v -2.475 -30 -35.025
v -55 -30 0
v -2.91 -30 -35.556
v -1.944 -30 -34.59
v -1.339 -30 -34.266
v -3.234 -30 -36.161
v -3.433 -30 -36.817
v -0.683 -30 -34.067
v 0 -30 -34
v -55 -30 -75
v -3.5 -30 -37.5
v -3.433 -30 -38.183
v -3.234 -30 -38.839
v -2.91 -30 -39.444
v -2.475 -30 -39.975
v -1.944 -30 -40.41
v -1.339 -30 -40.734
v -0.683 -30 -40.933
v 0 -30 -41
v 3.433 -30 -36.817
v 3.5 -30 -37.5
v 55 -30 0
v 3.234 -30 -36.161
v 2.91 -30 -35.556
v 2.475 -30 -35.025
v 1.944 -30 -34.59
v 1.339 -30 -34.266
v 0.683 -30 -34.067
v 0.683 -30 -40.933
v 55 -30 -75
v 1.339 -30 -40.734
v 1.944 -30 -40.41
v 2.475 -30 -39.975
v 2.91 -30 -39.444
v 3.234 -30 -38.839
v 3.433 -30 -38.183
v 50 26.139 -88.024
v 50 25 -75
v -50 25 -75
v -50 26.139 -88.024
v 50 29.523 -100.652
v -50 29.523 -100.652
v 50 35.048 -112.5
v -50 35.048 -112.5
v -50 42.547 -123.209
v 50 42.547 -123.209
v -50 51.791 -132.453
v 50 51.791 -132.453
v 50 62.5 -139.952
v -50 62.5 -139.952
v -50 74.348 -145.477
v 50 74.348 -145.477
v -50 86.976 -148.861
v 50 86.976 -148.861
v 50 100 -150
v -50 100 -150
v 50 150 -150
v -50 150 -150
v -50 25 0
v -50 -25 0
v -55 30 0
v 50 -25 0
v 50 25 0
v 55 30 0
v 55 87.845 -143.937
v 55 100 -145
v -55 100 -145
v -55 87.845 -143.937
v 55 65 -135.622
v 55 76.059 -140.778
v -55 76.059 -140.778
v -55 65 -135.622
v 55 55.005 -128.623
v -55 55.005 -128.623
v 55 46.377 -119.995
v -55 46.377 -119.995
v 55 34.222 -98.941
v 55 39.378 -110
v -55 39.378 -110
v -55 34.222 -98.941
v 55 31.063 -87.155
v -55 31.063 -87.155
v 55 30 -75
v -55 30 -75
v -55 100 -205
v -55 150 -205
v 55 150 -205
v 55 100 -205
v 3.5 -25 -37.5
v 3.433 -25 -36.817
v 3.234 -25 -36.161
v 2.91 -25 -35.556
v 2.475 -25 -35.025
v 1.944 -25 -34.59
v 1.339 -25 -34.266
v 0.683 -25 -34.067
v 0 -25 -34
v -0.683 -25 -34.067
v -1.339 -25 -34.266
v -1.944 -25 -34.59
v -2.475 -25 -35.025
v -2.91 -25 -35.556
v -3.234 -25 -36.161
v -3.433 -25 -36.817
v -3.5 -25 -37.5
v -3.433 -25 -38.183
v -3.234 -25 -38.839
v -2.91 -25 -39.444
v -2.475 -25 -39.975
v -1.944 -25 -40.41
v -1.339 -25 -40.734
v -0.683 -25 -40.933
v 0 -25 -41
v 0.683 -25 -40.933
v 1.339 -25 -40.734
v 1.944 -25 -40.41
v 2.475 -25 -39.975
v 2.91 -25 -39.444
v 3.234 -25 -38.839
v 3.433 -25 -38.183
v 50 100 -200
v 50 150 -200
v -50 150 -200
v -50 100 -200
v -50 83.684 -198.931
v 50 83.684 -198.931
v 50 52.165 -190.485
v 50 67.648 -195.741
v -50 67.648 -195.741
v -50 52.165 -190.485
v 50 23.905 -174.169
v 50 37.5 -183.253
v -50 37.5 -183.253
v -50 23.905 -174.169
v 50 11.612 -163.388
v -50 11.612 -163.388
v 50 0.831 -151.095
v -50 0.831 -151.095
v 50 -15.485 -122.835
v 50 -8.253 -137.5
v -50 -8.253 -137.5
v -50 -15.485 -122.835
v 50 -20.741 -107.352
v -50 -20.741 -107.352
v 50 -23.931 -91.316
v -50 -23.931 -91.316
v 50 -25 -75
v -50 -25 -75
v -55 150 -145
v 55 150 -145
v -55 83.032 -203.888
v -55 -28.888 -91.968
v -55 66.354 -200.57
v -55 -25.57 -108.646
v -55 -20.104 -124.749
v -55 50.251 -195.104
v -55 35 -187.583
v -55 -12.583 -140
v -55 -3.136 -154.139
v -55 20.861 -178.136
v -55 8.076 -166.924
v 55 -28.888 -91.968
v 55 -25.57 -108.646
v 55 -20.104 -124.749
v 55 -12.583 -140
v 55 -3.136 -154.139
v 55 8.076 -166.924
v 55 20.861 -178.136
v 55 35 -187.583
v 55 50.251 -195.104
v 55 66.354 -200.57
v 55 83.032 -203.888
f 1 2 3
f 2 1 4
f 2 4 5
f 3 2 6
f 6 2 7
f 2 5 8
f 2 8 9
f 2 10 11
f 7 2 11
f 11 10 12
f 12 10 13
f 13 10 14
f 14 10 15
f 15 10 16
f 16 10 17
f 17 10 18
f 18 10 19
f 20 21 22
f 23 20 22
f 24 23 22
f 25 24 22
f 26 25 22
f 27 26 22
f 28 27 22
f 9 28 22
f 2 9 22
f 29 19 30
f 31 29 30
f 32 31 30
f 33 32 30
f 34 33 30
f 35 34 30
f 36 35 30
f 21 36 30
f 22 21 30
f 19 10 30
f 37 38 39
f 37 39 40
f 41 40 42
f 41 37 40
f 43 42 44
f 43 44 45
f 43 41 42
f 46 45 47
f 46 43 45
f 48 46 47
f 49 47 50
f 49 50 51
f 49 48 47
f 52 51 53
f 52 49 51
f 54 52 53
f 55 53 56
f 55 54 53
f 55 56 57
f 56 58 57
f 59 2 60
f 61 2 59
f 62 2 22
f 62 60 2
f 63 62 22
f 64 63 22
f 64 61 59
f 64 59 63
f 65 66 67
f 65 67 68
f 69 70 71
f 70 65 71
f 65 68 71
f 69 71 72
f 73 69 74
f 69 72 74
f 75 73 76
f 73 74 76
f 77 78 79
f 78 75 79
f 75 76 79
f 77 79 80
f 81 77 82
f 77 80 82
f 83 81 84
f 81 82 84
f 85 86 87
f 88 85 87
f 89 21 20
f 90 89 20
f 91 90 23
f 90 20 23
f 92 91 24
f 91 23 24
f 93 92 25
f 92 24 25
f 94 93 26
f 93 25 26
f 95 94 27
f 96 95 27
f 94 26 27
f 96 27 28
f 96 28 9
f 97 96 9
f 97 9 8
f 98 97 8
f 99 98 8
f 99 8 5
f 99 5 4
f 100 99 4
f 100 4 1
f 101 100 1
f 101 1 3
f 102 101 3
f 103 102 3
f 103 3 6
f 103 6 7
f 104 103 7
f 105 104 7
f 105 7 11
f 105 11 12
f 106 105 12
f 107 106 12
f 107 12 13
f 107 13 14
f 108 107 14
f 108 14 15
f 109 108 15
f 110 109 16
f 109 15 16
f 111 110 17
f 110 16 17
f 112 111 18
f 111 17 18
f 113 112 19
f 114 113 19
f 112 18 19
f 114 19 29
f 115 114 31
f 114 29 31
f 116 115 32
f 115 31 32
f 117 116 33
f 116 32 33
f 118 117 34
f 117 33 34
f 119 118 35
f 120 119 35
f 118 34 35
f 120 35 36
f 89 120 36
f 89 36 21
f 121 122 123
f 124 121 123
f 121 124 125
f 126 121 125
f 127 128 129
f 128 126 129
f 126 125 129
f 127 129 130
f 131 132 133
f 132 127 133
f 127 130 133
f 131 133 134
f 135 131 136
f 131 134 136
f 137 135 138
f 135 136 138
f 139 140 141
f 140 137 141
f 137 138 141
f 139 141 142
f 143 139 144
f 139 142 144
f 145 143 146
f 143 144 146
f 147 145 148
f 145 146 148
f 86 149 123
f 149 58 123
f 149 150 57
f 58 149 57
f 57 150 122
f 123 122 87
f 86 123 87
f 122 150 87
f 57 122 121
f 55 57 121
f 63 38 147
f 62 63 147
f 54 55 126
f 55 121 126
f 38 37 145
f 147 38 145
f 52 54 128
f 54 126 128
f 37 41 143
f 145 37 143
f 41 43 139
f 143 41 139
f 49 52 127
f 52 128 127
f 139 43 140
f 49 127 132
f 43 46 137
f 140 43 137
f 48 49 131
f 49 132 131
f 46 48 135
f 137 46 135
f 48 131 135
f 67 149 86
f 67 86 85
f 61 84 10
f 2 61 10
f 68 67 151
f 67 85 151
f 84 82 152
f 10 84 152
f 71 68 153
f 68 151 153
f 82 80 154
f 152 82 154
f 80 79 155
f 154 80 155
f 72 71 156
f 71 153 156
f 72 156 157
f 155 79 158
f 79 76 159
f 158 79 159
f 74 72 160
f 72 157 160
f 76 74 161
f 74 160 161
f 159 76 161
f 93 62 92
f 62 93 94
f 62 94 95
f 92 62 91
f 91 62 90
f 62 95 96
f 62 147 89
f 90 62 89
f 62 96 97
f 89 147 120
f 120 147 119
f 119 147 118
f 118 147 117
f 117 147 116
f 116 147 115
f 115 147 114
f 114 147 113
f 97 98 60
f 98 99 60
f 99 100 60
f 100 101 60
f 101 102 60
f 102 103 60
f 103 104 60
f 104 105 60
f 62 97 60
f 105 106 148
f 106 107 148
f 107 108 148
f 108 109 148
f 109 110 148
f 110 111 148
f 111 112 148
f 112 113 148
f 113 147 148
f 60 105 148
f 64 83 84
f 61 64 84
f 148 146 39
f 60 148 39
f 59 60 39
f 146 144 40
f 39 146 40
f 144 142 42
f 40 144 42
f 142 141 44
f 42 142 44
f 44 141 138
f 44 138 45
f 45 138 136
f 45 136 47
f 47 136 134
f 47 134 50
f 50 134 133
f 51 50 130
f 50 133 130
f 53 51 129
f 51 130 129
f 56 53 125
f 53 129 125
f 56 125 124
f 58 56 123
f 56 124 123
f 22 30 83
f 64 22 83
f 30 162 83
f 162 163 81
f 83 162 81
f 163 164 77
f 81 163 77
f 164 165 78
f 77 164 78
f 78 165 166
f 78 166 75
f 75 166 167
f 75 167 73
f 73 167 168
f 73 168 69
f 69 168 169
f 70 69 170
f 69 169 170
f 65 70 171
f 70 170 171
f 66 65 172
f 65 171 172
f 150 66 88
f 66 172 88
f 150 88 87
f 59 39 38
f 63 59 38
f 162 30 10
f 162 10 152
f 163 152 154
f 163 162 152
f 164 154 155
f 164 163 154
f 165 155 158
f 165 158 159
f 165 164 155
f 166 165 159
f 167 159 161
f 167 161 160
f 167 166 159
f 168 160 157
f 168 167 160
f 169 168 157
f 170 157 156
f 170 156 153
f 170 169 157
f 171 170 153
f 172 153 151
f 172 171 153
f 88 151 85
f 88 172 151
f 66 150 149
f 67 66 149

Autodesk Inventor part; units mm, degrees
ref_plane "YZ Plane" through (0, 0, 0) normal (1, 0, 0) x (0, 1, 0)
ref_plane "XZ Plane" through (0, 0, 0) normal (0, 1, 0) x (-1, 0, 0)
ref_plane "XY Plane" through (0, 0, 0) normal (0, 0, 1) x (1, 0, 0)
sketch "Sketch2" plane through (0, 0, 0) normal (0, 0, 1) x (1, 0, 0)
  line L0 (-50, -25) -> (50, -25)
  line L1 (50, -25) -> (50, 25)
  line L2 (50, 25) -> (-50, 25)
  line L3 (-50, 25) -> (-50, -25)
  line L4 (-50, -25) -> (50, 25) construction
  line L5 (50, -25) -> (-50, 25) construction
  line L6 (-55, -30) -> (55, -30)
  line L7 (55, -30) -> (55, 30)
  line L8 (55, 30) -> (-55, 30)
  line L9 (-55, 30) -> (-55, -30)
  line L10 (-55, -30) -> (55, 30) construction
  line L11 (55, -30) -> (-55, 30) construction
  point P0 (0, 0)
  dimension "d0" = 100
  dimension "d1" = 50
  dimension "d2" = 110
  dimension "d3" = 60
sketch "Sketch3" plane through (0, 0, 0) normal (1, 0, 0) x (0, 1, 0)
  line L0 (0, 0) -> (0, -75)
  arc A0 (0, -75) -> (100, -175) centre (100, -75) ccw
  line L1 (100, -75) -> (100, -175) construction
  line L2 (100, -75) -> (0, -75) construction
  line L3 (100, -175) -> (150, -175)
sweep "Sweep1" add profiles "Sketch2" path "Sketch3"
sketch "Sketch4" plane through (-55, -30, 0) normal (0, -1, 0) x (1, 0, 0)
  circle A0 centre (55, -37.5) radius 3.5
  point P0 (55, 0)
  dimension "d9" = 7
extrude "Extrusion1" cut sketch "Sketch4" against normal blind 10
properties part number "RecTubeNewTapping"
